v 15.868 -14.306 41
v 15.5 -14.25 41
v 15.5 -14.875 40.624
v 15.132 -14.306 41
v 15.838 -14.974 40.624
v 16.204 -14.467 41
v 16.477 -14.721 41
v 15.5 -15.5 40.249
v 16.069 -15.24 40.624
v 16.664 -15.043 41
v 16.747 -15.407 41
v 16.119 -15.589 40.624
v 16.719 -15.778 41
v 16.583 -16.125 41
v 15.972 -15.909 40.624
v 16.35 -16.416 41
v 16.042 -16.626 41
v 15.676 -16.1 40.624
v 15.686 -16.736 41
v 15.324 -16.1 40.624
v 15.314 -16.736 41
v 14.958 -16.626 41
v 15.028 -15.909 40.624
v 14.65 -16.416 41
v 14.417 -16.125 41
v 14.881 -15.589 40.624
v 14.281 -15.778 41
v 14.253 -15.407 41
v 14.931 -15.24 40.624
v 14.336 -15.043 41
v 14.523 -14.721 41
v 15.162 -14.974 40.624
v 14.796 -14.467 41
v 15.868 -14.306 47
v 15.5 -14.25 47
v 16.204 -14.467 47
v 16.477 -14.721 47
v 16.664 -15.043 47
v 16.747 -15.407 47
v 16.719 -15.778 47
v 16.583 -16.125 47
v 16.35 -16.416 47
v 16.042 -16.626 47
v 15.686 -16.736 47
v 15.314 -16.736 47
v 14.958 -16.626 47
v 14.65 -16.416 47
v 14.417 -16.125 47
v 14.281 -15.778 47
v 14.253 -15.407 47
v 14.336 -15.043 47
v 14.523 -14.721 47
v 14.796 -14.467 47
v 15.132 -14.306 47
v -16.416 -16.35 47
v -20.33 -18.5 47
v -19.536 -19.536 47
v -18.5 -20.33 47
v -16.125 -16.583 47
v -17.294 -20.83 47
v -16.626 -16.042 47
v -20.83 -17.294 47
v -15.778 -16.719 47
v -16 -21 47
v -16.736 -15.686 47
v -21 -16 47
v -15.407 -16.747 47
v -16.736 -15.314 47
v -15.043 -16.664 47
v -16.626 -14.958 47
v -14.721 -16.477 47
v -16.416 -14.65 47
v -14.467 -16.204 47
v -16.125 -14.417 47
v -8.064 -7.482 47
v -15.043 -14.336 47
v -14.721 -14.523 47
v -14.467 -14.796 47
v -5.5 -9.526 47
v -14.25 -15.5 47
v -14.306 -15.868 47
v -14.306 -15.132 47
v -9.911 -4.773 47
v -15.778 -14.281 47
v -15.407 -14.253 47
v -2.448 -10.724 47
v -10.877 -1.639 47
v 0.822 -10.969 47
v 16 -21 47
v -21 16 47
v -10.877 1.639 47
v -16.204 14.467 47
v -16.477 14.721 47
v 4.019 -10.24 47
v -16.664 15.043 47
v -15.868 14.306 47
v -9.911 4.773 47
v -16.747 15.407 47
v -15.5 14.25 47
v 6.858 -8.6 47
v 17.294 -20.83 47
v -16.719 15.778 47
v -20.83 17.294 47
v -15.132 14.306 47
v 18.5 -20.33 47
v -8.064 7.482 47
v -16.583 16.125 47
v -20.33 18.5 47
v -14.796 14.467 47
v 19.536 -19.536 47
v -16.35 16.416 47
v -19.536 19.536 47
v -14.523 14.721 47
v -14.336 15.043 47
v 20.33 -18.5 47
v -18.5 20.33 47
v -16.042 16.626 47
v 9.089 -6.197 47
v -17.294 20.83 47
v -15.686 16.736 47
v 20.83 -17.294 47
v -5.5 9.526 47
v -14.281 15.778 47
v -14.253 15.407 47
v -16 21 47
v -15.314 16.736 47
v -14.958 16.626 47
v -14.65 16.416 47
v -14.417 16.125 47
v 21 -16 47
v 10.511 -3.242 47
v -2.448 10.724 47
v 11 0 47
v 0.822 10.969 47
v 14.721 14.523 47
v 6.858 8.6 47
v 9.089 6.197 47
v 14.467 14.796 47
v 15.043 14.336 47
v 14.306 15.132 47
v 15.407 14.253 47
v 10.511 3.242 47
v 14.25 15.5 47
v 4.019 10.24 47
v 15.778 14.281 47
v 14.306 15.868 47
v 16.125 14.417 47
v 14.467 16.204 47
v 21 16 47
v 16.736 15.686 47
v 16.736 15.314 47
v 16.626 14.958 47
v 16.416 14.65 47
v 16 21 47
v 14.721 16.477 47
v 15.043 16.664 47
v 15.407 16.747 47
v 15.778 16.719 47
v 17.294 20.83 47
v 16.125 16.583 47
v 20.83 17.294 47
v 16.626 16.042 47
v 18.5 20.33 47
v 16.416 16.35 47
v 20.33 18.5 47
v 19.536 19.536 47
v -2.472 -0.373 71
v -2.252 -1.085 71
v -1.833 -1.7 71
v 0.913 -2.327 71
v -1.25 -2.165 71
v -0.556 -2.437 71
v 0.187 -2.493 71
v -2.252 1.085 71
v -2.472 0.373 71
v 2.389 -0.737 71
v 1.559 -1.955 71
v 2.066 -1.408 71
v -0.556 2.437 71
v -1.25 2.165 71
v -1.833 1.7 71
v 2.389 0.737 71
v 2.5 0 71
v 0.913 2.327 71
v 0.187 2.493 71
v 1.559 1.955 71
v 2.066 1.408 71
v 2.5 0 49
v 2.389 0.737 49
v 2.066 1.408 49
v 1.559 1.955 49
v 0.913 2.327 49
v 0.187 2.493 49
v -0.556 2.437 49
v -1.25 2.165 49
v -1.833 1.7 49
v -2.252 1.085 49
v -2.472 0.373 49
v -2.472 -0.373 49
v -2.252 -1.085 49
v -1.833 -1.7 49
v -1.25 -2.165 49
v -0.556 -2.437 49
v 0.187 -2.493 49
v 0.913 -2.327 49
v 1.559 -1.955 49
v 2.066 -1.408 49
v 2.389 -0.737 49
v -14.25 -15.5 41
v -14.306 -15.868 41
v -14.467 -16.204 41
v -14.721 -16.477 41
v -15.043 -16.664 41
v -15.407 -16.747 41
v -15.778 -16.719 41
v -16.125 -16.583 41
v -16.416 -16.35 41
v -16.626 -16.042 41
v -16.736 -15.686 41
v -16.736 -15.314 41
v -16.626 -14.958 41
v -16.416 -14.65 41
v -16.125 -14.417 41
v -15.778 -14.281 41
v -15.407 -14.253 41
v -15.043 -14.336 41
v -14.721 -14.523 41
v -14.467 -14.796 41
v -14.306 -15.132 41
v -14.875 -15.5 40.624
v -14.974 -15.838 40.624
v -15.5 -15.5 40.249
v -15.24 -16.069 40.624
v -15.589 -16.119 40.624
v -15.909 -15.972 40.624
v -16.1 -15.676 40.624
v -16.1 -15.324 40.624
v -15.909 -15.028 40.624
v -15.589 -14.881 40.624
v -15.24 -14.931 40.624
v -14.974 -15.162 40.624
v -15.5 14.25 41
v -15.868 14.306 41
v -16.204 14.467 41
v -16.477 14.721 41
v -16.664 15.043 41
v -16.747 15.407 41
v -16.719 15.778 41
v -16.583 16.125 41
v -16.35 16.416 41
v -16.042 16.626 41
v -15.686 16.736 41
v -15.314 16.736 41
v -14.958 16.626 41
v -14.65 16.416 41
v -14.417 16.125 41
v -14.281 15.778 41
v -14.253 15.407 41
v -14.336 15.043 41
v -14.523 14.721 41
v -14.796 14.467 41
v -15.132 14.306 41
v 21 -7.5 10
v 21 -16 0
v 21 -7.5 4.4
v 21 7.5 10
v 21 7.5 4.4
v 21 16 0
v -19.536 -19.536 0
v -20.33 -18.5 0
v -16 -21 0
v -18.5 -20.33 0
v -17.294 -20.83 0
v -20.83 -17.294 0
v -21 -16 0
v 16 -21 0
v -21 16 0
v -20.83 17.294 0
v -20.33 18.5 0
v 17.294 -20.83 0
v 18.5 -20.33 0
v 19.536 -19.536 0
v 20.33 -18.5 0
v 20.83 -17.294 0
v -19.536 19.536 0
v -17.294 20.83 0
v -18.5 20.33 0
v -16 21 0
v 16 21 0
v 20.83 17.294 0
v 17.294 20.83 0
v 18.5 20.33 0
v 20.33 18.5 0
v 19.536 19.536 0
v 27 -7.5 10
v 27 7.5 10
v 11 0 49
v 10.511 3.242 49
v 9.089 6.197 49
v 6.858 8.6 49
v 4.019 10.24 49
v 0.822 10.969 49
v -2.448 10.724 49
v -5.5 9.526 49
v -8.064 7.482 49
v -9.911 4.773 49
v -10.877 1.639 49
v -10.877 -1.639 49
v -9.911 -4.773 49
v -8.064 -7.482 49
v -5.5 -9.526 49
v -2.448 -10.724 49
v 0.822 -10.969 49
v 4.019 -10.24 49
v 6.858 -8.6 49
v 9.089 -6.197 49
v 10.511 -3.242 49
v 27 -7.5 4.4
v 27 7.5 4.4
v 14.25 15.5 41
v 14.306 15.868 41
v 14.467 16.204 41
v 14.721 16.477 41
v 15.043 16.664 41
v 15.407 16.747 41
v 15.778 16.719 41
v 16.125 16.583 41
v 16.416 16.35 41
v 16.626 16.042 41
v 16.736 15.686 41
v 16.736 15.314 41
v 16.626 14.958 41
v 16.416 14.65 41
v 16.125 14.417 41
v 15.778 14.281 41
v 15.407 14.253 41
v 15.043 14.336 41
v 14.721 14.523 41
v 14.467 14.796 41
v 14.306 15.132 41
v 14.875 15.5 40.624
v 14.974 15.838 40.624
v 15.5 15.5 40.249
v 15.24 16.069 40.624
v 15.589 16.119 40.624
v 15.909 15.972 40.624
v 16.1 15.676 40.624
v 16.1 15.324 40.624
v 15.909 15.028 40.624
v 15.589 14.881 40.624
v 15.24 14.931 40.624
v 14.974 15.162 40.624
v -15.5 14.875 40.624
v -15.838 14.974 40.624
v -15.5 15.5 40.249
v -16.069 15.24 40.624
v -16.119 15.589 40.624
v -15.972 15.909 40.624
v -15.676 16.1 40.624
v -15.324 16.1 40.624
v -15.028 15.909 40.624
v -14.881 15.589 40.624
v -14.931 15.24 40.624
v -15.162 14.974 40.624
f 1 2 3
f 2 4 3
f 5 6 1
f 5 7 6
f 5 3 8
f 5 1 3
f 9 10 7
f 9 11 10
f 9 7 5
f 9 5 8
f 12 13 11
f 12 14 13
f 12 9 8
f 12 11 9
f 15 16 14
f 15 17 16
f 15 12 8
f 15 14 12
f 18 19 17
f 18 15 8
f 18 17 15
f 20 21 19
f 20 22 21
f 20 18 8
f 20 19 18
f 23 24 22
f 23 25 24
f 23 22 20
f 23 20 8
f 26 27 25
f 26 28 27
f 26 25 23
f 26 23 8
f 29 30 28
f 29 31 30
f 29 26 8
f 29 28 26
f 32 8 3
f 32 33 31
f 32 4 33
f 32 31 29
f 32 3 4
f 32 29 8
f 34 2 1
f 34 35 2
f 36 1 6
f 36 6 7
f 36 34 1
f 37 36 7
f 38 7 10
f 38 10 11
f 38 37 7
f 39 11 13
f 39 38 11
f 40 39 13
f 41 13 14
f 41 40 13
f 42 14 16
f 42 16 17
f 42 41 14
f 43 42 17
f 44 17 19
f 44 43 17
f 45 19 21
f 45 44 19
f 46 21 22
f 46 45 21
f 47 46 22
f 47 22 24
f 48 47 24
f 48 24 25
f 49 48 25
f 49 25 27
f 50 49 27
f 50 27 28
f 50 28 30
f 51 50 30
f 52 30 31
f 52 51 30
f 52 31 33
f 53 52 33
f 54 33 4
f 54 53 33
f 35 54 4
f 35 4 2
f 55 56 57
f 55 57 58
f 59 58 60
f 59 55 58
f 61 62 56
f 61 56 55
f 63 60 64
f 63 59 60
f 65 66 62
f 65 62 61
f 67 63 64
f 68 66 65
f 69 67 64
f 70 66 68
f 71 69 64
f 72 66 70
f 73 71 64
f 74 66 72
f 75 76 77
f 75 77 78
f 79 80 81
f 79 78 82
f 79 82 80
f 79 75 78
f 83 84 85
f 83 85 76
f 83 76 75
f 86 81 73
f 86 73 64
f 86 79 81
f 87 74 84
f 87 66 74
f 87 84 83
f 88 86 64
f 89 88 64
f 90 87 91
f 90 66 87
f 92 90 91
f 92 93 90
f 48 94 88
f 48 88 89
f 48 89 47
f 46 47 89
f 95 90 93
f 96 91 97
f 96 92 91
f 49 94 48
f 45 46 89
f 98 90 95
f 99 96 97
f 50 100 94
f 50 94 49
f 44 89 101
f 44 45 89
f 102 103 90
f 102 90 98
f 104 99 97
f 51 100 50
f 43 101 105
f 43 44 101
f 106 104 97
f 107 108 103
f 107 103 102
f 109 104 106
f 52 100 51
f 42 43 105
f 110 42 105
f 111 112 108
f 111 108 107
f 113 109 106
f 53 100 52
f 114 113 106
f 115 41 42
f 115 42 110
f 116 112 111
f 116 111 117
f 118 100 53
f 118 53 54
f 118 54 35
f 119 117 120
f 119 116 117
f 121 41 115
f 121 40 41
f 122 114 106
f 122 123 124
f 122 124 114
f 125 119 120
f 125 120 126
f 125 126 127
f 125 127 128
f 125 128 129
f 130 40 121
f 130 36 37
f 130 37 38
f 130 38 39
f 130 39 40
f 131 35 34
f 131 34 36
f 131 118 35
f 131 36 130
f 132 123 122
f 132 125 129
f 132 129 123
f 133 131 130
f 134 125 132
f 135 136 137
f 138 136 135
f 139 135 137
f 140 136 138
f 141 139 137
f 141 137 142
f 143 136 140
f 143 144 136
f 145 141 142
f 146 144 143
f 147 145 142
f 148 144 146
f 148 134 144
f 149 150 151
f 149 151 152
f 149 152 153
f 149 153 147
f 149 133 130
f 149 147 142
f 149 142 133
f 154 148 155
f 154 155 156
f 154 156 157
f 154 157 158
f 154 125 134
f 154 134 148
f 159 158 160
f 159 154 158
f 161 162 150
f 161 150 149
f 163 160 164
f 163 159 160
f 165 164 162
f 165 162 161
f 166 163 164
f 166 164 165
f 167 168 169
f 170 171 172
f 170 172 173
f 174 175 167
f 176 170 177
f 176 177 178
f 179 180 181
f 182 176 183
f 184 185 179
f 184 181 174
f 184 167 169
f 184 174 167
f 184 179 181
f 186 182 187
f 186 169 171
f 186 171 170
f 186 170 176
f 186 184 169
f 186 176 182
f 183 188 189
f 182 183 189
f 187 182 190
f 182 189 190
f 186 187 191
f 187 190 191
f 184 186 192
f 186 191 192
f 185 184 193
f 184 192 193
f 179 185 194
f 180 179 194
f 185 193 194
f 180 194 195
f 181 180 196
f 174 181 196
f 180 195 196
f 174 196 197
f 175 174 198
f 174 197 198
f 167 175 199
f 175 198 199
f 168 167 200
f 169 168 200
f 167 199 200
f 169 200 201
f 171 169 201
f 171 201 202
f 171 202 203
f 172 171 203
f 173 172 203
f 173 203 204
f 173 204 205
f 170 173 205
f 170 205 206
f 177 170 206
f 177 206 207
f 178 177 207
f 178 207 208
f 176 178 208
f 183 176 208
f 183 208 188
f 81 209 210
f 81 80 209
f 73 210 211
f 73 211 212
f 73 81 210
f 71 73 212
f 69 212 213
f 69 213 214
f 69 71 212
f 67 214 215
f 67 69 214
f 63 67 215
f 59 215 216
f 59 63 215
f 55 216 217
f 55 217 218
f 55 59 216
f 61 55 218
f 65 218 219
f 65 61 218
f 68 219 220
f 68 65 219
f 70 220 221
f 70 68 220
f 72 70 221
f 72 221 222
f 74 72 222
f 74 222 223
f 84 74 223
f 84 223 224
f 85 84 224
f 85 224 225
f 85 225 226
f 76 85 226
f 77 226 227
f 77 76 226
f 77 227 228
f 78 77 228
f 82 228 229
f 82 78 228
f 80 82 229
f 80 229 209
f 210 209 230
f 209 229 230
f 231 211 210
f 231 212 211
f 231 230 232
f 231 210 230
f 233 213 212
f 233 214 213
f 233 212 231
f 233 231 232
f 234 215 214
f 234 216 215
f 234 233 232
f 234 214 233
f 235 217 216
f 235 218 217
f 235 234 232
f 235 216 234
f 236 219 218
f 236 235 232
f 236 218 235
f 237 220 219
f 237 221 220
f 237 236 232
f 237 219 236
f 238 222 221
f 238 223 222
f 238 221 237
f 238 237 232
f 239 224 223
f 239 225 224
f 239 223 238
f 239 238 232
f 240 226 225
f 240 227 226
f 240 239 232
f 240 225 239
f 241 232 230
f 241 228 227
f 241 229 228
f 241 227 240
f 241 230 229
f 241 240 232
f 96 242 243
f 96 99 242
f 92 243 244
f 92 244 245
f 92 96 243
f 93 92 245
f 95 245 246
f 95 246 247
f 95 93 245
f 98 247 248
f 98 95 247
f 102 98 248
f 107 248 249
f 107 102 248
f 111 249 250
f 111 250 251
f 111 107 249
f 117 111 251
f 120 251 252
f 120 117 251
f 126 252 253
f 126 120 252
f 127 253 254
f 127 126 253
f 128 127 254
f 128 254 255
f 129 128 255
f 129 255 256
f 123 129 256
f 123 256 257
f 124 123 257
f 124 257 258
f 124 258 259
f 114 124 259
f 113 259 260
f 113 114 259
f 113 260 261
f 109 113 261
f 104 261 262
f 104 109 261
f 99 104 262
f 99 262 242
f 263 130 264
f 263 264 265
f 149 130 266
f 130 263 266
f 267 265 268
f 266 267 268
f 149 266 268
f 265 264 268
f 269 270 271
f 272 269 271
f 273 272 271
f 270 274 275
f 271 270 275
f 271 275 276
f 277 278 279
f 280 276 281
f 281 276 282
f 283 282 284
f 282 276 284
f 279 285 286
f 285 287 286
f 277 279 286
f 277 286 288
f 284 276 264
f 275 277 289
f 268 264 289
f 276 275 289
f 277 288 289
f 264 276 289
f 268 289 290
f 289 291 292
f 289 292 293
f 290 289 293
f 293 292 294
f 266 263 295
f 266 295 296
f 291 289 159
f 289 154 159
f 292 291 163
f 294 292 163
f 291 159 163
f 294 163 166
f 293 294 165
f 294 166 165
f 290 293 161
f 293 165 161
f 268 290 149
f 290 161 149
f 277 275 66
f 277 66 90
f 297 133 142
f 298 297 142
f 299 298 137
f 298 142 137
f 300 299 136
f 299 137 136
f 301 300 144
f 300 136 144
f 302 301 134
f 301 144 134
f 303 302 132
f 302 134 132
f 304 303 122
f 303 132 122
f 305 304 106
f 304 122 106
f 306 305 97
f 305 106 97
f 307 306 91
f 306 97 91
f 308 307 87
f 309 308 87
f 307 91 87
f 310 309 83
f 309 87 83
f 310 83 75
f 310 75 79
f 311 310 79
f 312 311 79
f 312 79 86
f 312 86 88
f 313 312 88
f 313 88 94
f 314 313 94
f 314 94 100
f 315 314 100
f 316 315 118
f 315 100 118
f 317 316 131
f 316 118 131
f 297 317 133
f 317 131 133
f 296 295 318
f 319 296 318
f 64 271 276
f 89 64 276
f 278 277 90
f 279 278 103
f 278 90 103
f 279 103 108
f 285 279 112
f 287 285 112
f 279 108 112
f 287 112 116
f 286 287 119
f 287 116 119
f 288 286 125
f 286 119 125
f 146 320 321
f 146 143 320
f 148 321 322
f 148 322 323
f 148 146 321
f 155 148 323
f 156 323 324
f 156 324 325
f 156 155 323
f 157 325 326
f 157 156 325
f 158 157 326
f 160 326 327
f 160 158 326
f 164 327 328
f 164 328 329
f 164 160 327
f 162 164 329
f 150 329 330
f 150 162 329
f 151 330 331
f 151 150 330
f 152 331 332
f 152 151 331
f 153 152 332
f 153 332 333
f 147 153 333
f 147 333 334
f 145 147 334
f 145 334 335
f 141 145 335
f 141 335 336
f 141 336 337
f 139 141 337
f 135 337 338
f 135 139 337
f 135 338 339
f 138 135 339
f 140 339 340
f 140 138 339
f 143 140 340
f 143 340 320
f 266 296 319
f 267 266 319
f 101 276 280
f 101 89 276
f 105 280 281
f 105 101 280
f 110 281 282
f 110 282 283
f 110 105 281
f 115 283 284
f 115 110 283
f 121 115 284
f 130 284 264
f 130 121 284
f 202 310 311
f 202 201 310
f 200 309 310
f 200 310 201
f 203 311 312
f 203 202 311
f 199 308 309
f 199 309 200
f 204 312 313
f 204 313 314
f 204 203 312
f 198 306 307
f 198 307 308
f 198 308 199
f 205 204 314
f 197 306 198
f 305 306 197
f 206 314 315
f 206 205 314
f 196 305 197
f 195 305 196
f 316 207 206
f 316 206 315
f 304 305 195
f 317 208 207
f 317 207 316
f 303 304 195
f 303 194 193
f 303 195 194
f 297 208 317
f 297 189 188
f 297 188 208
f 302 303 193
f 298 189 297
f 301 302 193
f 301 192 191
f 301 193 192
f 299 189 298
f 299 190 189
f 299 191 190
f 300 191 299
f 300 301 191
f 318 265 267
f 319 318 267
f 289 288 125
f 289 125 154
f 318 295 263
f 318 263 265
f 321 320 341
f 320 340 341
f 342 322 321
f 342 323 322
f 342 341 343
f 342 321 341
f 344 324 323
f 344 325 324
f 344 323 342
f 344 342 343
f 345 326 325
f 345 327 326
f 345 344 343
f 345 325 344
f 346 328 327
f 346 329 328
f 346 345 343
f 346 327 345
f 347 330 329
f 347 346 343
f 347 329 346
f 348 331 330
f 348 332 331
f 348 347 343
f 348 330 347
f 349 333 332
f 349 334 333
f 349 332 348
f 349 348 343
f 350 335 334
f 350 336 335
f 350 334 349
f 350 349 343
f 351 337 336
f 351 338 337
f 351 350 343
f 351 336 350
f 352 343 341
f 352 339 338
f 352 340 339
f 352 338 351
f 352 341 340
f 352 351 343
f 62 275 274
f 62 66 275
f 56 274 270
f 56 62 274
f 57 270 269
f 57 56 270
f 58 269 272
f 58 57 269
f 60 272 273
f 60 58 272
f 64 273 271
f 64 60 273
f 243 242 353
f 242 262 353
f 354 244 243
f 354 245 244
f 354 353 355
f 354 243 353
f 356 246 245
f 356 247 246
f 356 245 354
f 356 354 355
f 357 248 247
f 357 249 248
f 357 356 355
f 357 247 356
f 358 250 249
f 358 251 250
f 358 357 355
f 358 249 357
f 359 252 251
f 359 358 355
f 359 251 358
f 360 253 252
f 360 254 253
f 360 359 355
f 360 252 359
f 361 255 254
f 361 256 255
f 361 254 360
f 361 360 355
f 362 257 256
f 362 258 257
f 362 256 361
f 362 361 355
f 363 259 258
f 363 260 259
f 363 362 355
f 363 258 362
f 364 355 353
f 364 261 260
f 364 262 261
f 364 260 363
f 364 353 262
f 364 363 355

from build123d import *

# Parameters (mm, degrees)
SKETCH1_W           = 42
SKETCH1_H           = 42
BOSS_EXTRUDE1_DEPTH = 47
SKETCH2_R           = 2.5
BOSS_EXTRUDE4_DEPTH = 24
SKETCH2_5_R         = 11
SKETCH2_5_R_2       = 2.5
BOSS_EXTRUDE5_DEPTH = 2
CIRPATTERN1_COUNT   = 4
FILLET1_R           = 5
SKETCH14_W          = 5.6
SKETCH14_H          = 15
BOSS_EXTRUDE6_DEPTH = 6


with BuildPart() as part:
    # Sketch1 → Boss-Extrude1 (new body)
    with BuildSketch(Plane.XY):
        Rectangle(SKETCH1_W, SKETCH1_H)
    extrude(amount=BOSS_EXTRUDE1_DEPTH)

    # Sketch2 → Boss-Extrude4 (add)
    with BuildSketch(Plane.XY.offset(47)):
        Circle(SKETCH2_R)
    extrude(amount=BOSS_EXTRUDE4_DEPTH)

    # Sketch2<5> → Boss-Extrude5 (add)
    with BuildSketch(Plane.XY.offset(47)):
        Circle(SKETCH2_5_R)
        Circle(SKETCH2_5_R_2, mode=Mode.SUBTRACT)
    extrude(amount=BOSS_EXTRUDE5_DEPTH)

    # Sketch12 → M3 Tapped Hole3 (revolve, cut)
    with BuildSketch(Plane(origin=(-15.5, 15.5, 47), x_dir=(0, -1, 0), z_dir=(1, 0, 0))):
        Polygon((0, 0), (0, 6.751075774), (1.25, 6), (1.25, 0), align=None)
    m3_tapped_hole3 = revolve(axis=Axis((-15.5, 15.5, 53.35), (0, 0, -1)), mode=Mode.SUBTRACT)

    # CirPattern1: M3 Tapped Hole3 ×4 about axis
    cirpattern1_axis = Axis((0, 0, 49), (0, 0, 1))
    for i in range(1, CIRPATTERN1_COUNT):
        add(m3_tapped_hole3.rotate(cirpattern1_axis, i * 360 / CIRPATTERN1_COUNT), mode=Mode.SUBTRACT)

    # Fillet1
    fillet1_edges = [part.edges().sort_by_distance(p)[0] for p in [
        (-21, -21, 23.5),
        (-21, 21, 23.5),
        (21, -21, 23.5),
        (21, 21, 23.5),
    ]]
    fillet(fillet1_edges, radius=FILLET1_R)

    # Sketch14 → Boss-Extrude6 (add)
    with BuildSketch(Plane(origin=(21, 0, 0), x_dir=(0, 0, -1), z_dir=(1, 0, 0))):
        with Locations((-7.2, 0)):
            Rectangle(SKETCH14_W, SKETCH14_H)
    extrude(amount=BOSS_EXTRUDE6_DEPTH)


solid = part.part
